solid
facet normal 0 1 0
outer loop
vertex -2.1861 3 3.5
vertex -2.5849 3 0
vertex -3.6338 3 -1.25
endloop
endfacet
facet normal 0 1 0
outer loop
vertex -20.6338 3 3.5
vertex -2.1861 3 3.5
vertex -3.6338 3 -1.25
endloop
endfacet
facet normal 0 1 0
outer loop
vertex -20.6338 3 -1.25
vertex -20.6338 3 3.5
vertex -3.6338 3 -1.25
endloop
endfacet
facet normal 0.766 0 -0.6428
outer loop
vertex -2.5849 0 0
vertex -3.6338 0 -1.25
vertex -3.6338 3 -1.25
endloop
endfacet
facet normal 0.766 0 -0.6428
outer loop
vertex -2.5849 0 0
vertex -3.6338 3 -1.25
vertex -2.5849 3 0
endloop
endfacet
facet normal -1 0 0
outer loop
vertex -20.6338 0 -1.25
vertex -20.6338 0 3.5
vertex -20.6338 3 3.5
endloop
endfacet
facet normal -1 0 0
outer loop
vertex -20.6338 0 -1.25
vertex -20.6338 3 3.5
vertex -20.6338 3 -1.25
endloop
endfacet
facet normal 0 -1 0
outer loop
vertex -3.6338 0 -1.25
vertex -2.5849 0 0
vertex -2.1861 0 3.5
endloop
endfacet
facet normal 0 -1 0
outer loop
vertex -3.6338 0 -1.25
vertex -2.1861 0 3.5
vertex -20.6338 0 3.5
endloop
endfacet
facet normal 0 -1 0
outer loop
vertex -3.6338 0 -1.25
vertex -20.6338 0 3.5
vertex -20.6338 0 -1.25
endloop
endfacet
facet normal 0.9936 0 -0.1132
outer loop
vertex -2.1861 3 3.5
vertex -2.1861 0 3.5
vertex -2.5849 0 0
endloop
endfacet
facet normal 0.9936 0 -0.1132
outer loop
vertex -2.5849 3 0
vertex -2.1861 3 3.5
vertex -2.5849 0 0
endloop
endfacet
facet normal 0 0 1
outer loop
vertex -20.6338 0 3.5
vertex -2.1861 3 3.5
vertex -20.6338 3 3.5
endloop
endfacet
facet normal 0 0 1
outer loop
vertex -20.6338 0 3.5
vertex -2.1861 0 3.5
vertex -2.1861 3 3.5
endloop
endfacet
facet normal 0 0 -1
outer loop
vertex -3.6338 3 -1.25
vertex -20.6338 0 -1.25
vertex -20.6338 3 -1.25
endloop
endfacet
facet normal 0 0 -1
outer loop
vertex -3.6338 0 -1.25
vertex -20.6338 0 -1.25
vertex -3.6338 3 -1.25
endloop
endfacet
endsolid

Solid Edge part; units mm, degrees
sketch "Sketch1" plane through (0, 0, 0) normal (0, -1, 0) x (1, 0, 0)
  line L0 (-20.6338, -1.25) -> (-3.6338, -1.25)
  line L1 (-3.6338, -1.25) -> (-2.5849, 0)
  line L2 (-2.1861, 3.5) -> (-2.5849, 0)
  line L3 (-2.1861, 3.5) -> (-20.6338, 3.5)
  line L4 (-20.6338, 3.5) -> (-20.6338, -1.25)
extrude "Protrusion1" add sketch "Sketch1" against normal blind 3
properties material "Stainless Steel, 420"
